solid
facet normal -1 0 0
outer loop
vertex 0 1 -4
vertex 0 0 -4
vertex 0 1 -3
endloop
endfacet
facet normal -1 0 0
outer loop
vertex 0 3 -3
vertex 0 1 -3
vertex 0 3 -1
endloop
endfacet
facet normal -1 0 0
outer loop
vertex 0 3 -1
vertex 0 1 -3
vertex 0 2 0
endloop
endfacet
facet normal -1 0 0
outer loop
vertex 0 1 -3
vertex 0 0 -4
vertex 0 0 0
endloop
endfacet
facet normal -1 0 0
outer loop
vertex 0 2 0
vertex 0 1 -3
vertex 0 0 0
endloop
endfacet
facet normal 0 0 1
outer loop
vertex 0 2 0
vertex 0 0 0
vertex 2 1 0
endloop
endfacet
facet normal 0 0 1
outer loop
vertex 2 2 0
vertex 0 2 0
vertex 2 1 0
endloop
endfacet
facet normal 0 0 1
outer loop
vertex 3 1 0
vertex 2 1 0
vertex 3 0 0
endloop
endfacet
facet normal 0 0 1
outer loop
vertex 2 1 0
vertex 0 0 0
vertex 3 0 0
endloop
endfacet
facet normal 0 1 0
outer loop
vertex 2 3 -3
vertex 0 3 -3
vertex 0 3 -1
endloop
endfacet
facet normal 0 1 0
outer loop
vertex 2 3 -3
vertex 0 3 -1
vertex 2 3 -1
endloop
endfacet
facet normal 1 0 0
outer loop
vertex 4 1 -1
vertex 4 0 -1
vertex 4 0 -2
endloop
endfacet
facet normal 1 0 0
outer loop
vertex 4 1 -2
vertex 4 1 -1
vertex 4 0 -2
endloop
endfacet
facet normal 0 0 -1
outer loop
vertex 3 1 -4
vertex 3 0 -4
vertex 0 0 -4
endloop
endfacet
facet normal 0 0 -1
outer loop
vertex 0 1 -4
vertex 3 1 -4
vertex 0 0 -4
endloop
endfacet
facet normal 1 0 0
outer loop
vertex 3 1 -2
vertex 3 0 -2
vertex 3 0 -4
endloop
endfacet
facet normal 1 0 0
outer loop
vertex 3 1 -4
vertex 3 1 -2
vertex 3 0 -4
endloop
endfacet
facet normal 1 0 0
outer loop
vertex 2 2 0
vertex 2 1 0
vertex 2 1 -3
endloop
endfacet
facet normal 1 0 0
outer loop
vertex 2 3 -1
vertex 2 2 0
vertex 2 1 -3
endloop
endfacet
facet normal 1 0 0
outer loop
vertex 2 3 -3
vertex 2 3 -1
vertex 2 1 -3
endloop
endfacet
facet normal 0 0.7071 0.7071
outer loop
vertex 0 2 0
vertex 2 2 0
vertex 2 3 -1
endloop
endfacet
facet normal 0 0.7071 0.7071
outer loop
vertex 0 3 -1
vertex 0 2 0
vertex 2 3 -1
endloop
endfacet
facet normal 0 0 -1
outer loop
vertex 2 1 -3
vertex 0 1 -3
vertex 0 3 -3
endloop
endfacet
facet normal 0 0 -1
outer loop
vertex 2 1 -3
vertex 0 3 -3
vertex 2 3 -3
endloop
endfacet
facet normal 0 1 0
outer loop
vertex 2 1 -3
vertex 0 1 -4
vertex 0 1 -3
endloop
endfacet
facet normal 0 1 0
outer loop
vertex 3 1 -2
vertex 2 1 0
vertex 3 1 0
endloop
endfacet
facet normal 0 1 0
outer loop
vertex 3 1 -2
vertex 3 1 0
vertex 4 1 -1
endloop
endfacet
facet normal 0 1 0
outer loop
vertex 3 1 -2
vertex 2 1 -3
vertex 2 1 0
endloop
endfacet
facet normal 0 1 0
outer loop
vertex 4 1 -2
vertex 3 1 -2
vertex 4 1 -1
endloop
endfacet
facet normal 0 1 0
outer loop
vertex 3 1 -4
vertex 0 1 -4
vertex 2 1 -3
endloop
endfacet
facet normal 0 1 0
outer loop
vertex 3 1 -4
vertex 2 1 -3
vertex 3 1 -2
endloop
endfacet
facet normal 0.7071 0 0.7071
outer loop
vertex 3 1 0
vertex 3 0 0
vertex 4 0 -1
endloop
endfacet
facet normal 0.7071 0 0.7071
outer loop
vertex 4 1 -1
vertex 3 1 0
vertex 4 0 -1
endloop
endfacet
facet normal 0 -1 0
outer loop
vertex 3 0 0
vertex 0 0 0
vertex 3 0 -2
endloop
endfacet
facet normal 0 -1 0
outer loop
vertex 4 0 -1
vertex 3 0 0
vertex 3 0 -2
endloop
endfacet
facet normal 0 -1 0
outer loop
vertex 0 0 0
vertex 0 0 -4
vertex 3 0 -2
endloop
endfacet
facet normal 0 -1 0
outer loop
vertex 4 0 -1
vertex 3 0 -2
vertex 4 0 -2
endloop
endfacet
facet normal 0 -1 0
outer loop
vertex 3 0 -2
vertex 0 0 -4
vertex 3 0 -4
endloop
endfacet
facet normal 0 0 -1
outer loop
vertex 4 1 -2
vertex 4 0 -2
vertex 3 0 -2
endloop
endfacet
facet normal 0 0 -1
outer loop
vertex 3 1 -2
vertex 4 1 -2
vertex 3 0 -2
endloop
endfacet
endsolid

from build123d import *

# Parameters (mm, degrees)
EXTRUDE_1_DEPTH     = 1
SKETCH_1_3_W        = 2
SKETCH_1_3_H        = 3
EXTRUDE_2_DEPTH     = 3
CUT_EXTRUDE_1_DEPTH = 3


with BuildPart() as part:
    # 草圖1 → 填料-伸長1 (new body)
    with BuildSketch(Plane(origin=(0, 0, 0), x_dir=(1, 0, 0), z_dir=(0, 1, 0))):
        Polygon((0, 0), (3, 0), (4, 1), (4, 2), (3, 2), (3, 4), (0, 4), align=None)
    extrude(amount=EXTRUDE_1_DEPTH)

    # 草圖1<3> → 填料-伸長2 (add)
    with BuildSketch(Plane(origin=(0, 0, 0), x_dir=(1, 0, 0), z_dir=(0, 1, 0))):
        with Locations((1, 1.5)):
            Rectangle(SKETCH_1_3_W, SKETCH_1_3_H)
    extrude(amount=EXTRUDE_2_DEPTH)

    # 草圖2 → 除料-伸長1 (cut)
    with BuildSketch(Plane(origin=(2, 0, 0), x_dir=(0, 0, -1), z_dir=(1, 0, 0))):
        Polygon((0, 3), (0, 2), (1, 3), align=None)
    extrude(amount=-CUT_EXTRUDE_1_DEPTH, mode=Mode.SUBTRACT)


solid = part.part
